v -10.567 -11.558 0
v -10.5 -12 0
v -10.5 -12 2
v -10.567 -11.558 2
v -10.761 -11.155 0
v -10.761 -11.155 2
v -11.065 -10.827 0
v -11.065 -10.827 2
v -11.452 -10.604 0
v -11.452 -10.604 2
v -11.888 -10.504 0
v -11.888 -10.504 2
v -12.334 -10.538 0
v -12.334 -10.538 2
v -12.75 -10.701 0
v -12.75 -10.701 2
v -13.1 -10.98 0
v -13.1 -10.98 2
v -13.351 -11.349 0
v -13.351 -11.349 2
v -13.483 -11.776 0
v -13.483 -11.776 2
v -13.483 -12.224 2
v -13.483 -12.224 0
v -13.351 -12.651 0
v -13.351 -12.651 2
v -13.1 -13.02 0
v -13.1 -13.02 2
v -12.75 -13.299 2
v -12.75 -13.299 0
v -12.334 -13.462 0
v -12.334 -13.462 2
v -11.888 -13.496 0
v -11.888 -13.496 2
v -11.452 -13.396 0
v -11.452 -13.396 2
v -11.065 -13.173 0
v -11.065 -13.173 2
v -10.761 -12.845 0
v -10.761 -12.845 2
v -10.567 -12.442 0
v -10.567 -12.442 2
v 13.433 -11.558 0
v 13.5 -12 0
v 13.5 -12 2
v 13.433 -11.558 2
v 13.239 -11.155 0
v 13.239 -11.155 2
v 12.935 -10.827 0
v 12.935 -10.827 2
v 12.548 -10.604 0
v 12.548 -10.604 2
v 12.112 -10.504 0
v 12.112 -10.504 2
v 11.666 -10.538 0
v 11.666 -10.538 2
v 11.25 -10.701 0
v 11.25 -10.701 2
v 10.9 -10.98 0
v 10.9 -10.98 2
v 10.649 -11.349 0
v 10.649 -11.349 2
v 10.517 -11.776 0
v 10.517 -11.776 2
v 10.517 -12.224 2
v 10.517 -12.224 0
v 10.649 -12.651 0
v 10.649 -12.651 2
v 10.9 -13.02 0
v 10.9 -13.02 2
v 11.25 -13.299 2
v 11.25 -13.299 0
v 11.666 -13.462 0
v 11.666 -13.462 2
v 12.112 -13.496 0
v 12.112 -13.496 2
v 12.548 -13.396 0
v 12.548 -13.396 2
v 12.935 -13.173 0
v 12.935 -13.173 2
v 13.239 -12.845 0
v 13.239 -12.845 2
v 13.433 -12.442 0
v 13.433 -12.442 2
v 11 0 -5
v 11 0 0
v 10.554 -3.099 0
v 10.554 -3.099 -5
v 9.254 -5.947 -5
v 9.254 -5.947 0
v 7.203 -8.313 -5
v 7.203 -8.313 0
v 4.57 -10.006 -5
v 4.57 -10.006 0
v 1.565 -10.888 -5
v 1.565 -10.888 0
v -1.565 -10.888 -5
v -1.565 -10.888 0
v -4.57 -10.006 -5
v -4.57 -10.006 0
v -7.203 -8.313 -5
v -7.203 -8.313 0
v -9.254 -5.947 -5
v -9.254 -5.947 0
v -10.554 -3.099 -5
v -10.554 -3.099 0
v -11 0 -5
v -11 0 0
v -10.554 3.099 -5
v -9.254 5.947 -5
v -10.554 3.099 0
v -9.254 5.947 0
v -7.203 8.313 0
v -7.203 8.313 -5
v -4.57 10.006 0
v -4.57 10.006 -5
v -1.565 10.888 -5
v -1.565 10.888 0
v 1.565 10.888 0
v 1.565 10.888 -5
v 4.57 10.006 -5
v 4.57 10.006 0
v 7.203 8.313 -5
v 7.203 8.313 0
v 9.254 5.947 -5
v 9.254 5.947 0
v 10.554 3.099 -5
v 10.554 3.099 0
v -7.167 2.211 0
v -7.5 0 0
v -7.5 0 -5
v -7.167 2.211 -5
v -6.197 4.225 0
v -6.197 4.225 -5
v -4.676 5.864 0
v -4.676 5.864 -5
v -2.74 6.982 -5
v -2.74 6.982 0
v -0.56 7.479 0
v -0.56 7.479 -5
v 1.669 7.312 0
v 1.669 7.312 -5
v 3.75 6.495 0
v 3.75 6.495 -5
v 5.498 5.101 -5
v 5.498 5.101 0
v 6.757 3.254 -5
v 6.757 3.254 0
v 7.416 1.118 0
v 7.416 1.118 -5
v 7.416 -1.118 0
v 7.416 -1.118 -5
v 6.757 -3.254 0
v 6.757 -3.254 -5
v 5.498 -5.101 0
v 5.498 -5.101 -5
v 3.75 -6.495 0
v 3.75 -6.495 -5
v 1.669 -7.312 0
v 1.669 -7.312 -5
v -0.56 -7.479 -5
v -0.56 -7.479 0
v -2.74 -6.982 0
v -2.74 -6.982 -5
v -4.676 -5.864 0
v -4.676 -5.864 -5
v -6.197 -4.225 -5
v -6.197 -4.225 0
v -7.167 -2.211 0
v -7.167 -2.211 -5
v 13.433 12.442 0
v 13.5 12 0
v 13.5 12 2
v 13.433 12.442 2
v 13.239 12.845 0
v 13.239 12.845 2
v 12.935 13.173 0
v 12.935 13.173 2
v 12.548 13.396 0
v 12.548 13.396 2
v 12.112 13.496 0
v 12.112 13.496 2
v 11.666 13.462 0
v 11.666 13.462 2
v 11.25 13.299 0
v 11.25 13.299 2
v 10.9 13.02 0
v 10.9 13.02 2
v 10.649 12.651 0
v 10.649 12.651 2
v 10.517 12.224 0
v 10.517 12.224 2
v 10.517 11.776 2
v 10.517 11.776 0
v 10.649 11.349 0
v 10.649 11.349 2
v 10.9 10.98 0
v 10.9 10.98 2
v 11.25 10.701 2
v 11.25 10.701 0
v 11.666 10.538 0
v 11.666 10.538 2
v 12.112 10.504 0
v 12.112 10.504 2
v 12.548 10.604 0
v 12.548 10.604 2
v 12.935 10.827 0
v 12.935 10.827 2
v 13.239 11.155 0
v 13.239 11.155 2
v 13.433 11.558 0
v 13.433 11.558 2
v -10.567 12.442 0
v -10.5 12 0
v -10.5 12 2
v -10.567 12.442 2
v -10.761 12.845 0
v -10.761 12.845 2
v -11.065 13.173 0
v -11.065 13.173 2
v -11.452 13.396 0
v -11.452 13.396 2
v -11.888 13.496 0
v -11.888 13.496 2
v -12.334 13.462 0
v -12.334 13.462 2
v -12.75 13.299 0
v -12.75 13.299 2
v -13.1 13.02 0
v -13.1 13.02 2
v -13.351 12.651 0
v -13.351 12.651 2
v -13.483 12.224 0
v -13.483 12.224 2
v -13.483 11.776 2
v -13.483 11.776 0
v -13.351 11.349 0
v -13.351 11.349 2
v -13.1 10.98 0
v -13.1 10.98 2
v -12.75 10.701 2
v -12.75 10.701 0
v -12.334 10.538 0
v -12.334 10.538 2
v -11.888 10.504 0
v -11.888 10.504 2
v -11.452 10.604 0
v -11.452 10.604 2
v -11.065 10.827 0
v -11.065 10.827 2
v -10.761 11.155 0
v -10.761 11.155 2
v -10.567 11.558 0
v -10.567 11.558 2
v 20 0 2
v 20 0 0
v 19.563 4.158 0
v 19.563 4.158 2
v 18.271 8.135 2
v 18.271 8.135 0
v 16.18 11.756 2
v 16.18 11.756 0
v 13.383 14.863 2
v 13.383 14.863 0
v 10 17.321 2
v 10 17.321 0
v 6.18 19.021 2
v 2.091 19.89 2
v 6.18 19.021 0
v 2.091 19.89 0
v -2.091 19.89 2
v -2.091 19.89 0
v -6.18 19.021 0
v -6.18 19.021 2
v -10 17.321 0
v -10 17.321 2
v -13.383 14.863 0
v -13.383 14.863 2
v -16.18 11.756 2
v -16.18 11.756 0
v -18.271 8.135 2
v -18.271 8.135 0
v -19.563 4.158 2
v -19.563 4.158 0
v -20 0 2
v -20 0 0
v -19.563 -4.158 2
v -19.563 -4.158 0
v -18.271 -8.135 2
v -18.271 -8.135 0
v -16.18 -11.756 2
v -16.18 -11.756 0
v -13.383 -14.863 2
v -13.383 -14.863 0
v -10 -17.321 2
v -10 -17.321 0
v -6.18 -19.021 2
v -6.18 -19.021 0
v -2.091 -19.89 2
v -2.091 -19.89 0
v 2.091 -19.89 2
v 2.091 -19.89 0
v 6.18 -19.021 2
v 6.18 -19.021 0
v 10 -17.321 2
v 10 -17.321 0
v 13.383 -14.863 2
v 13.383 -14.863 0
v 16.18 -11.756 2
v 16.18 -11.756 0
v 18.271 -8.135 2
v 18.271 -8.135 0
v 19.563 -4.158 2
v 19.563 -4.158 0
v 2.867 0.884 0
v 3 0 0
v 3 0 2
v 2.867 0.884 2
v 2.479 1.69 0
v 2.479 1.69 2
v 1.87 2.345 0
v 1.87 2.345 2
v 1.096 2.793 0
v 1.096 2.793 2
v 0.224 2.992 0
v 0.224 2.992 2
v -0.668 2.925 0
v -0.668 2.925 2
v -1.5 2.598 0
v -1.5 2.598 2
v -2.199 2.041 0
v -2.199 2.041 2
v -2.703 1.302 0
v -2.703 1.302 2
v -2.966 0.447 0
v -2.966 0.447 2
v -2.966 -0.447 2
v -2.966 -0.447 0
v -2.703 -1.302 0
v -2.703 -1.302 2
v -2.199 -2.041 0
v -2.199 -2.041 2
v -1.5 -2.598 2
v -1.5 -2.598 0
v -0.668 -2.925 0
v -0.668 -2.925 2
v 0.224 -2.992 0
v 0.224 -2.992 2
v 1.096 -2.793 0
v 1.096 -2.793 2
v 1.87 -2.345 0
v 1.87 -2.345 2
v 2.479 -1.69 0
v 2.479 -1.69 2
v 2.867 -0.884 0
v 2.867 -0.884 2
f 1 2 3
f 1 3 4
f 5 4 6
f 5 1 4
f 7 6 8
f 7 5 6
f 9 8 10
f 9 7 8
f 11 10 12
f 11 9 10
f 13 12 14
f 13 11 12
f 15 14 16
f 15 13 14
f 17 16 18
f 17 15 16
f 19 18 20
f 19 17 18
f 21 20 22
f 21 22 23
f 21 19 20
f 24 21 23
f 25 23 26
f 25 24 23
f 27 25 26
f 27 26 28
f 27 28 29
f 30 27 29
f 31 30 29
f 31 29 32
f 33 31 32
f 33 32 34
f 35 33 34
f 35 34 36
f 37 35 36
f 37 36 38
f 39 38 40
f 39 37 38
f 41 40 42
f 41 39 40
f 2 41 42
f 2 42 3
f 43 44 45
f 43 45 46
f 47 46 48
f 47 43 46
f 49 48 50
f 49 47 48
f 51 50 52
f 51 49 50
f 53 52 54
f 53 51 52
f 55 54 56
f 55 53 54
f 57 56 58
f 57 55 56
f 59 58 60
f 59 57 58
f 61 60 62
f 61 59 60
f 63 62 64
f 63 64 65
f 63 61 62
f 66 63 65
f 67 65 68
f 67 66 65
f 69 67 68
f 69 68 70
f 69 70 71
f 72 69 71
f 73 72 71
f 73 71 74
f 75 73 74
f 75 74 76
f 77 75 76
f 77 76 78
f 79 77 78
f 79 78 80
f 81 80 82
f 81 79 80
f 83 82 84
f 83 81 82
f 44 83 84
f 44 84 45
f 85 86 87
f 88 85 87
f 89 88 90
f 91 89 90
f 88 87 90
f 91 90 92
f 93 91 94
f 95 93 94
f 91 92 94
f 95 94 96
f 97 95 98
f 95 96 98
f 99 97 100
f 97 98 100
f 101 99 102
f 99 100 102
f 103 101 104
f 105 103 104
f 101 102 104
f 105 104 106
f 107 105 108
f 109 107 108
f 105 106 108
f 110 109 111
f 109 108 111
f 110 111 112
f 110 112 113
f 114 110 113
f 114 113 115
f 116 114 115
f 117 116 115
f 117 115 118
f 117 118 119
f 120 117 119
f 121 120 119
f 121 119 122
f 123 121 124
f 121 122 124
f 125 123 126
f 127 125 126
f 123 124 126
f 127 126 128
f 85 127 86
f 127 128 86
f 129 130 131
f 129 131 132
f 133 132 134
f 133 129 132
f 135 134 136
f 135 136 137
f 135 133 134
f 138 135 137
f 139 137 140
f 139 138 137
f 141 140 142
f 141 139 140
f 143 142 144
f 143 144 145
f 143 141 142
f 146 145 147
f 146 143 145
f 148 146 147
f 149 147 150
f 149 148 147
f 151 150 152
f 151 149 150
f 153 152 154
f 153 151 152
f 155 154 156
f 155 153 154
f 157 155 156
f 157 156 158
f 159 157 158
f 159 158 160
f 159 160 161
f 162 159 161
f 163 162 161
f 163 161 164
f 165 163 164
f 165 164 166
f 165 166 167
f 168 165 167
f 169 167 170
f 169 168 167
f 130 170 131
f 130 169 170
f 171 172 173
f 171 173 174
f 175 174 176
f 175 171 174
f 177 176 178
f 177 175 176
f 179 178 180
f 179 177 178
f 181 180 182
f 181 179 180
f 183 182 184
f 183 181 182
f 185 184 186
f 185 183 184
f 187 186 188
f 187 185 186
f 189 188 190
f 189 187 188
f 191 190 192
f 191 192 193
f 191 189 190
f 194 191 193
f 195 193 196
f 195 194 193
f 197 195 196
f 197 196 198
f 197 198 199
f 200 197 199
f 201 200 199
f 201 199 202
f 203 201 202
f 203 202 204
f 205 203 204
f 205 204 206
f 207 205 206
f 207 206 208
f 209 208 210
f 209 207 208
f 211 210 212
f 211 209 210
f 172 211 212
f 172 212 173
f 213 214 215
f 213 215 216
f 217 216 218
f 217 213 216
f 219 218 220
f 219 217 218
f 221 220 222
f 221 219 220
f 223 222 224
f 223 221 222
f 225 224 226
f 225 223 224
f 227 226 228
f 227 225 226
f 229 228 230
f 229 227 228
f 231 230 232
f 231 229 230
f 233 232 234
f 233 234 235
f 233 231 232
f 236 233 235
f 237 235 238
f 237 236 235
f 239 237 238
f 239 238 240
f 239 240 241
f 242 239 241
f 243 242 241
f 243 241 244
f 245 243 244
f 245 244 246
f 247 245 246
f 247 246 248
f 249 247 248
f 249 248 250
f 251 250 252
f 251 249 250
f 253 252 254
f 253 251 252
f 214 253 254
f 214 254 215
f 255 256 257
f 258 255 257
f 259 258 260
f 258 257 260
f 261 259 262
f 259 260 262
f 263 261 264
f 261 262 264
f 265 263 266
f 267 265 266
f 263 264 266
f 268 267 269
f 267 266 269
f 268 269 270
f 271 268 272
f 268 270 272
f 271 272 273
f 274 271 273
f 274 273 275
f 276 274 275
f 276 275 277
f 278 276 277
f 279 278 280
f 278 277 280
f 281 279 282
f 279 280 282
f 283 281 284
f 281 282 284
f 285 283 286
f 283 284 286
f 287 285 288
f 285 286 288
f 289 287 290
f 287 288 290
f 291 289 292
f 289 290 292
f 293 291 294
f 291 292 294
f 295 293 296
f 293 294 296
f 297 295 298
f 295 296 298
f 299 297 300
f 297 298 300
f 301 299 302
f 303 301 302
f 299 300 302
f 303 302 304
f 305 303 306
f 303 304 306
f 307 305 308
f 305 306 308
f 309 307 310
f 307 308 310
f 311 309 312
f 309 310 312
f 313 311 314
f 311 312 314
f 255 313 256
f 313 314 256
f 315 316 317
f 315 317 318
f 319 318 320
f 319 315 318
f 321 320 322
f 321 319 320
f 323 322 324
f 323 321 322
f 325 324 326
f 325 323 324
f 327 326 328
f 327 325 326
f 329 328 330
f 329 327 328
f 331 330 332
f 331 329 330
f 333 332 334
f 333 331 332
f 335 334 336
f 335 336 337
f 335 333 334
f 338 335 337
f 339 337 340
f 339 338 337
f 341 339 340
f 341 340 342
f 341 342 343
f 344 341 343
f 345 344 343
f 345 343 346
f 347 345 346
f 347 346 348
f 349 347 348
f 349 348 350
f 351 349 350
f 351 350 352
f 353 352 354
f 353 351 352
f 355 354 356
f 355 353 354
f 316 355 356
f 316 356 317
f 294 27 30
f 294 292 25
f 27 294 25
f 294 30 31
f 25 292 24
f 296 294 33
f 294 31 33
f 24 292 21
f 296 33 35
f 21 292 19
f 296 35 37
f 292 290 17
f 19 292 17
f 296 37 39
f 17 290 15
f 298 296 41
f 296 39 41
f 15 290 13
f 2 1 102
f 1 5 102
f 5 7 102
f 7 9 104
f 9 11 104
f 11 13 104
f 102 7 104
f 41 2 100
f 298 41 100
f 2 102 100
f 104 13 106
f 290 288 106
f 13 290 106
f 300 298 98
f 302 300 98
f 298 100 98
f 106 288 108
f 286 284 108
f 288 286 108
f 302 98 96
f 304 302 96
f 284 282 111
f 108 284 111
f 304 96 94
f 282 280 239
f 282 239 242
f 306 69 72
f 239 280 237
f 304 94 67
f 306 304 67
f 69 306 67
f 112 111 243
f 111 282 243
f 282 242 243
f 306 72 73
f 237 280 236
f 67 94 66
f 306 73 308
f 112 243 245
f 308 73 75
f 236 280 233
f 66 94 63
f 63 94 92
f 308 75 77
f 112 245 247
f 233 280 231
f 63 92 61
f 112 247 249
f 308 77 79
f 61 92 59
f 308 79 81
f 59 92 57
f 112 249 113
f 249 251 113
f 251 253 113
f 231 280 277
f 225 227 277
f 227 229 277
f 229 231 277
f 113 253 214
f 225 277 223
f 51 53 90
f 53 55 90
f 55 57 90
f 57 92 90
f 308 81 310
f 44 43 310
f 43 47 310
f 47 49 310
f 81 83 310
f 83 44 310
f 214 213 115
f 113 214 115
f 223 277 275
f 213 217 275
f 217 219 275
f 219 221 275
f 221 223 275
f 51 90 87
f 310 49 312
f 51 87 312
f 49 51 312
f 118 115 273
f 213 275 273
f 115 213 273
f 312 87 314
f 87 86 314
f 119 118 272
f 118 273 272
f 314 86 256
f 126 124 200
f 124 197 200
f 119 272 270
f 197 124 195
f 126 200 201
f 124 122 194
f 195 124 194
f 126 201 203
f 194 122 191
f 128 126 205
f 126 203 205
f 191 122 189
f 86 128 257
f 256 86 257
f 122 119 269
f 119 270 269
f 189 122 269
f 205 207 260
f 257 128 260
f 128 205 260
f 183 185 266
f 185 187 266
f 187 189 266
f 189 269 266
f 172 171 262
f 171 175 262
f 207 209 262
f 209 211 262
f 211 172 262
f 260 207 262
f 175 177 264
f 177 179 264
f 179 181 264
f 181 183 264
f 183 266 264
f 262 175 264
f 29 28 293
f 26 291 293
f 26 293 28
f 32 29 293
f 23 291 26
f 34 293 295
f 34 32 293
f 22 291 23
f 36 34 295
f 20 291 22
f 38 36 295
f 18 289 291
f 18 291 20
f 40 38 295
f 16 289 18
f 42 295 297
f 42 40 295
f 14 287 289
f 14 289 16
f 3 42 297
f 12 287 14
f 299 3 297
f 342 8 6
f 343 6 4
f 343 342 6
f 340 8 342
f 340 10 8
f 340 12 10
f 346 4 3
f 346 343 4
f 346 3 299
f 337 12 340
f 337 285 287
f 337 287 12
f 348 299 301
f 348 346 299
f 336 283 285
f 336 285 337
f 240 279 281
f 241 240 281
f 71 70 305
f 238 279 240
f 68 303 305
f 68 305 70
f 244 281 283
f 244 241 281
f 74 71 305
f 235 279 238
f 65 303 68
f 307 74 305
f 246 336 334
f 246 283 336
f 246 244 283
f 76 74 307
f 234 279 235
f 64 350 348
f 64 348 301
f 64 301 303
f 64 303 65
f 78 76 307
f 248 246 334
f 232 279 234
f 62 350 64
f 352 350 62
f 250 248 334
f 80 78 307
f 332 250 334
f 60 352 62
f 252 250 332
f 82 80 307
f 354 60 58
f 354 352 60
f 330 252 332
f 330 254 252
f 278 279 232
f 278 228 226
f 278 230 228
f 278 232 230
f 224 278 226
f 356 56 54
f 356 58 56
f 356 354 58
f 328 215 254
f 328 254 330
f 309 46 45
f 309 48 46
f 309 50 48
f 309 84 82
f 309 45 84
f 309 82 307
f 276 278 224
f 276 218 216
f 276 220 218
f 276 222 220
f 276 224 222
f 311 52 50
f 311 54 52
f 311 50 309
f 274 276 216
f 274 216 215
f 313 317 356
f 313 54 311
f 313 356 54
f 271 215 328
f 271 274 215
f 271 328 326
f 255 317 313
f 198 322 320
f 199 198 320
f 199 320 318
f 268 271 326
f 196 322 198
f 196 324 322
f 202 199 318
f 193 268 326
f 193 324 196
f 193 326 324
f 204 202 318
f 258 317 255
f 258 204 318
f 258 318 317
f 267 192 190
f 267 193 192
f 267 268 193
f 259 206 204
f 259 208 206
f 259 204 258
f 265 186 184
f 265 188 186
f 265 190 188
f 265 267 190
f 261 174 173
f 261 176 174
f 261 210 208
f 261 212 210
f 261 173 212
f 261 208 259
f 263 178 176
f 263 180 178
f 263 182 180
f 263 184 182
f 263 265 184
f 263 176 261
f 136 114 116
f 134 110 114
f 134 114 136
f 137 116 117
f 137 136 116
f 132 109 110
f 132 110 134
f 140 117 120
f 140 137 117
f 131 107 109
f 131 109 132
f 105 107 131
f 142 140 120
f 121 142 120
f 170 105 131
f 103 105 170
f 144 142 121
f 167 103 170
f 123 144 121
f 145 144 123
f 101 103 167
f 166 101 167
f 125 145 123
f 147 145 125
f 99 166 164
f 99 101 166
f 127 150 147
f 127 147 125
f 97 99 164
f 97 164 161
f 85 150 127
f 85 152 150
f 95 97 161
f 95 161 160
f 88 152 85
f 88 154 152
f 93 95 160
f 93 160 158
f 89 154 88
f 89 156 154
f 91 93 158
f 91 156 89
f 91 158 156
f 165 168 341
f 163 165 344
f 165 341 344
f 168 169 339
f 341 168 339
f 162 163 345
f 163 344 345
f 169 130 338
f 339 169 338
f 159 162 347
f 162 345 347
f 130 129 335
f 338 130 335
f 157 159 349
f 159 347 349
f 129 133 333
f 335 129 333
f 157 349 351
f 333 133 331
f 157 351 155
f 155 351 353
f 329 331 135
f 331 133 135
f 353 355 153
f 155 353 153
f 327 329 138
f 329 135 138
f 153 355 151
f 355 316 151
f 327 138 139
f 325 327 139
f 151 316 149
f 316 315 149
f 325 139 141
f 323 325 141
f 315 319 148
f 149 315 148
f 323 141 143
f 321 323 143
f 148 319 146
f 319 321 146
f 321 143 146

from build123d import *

# Parameters (mm, degrees)
SKETCH_1_R      = 20
SKETCH_1_R_2    = 1.5
SKETCH_1_R_3    = 3
EXTRUDE_1_DEPTH = 2
SKETCH_3_R      = 11
SKETCH_3_R_2    = 7.5
EXTRUDE_2_DEPTH = 5


with BuildPart() as part:
    # 草图1 → 凸台-拉伸1 (new body)
    with BuildSketch(Plane.XY):
        Circle(SKETCH_1_R)
        with Locations((-12, 12)):
            Circle(SKETCH_1_R_2, mode=Mode.SUBTRACT)
        with Locations((12, 12)):
            Circle(SKETCH_1_R_2, mode=Mode.SUBTRACT)
        with Locations((12, -12)):
            Circle(SKETCH_1_R_2, mode=Mode.SUBTRACT)
        with Locations((-12, -12)):
            Circle(SKETCH_1_R_2, mode=Mode.SUBTRACT)
        Circle(SKETCH_1_R_3, mode=Mode.SUBTRACT)
    extrude(amount=EXTRUDE_1_DEPTH)

    # 草图3 → 凸台-拉伸2 (add)
    with BuildSketch(Plane(origin=(0, 0, 0), x_dir=(-1, 0, 0), z_dir=(0, 0, -1))):
        with Locations(Location((0, 0, 0), (0, 0, 180))):
            Circle(SKETCH_3_R)
        Circle(SKETCH_3_R_2, mode=Mode.SUBTRACT)
    extrude(amount=EXTRUDE_2_DEPTH)


solid = part.part
